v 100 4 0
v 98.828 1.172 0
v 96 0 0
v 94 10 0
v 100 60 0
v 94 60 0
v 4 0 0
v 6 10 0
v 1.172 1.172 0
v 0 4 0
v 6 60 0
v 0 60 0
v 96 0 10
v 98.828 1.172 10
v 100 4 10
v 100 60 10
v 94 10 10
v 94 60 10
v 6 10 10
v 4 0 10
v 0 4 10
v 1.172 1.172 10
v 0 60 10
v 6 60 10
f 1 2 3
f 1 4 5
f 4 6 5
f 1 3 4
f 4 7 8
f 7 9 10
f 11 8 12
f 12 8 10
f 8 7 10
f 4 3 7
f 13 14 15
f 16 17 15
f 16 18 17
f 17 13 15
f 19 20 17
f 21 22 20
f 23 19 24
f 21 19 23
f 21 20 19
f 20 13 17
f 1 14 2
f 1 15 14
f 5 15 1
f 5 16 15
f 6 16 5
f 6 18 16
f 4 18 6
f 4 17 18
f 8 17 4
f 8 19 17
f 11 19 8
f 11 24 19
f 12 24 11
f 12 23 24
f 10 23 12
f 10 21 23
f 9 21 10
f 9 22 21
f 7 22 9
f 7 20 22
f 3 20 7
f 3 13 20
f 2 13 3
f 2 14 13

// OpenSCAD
$fn = 32;

// ----------------------------------------------------------------------
// Heat sink frame: 100 x 60 mm frame, 6 mm walls
// ----------------------------------------------------------------------

// --- parameters (mm) ---
profile_height = 10;      // extrusion height
profile_points = 12;      // points of the closed outline

profile = [[0, 4], [1.172, 1.172], [4, 0], [96, 0], [98.828, 1.172], [100, 4], [100, 60], [94, 60], [94, 10], [6, 10], [6, 60], [0, 60]];  // single closed polygon, 12 points, counter clockwise

// --- the one profile operation ---
linear_extrude(height = profile_height) polygon(points = profile);
